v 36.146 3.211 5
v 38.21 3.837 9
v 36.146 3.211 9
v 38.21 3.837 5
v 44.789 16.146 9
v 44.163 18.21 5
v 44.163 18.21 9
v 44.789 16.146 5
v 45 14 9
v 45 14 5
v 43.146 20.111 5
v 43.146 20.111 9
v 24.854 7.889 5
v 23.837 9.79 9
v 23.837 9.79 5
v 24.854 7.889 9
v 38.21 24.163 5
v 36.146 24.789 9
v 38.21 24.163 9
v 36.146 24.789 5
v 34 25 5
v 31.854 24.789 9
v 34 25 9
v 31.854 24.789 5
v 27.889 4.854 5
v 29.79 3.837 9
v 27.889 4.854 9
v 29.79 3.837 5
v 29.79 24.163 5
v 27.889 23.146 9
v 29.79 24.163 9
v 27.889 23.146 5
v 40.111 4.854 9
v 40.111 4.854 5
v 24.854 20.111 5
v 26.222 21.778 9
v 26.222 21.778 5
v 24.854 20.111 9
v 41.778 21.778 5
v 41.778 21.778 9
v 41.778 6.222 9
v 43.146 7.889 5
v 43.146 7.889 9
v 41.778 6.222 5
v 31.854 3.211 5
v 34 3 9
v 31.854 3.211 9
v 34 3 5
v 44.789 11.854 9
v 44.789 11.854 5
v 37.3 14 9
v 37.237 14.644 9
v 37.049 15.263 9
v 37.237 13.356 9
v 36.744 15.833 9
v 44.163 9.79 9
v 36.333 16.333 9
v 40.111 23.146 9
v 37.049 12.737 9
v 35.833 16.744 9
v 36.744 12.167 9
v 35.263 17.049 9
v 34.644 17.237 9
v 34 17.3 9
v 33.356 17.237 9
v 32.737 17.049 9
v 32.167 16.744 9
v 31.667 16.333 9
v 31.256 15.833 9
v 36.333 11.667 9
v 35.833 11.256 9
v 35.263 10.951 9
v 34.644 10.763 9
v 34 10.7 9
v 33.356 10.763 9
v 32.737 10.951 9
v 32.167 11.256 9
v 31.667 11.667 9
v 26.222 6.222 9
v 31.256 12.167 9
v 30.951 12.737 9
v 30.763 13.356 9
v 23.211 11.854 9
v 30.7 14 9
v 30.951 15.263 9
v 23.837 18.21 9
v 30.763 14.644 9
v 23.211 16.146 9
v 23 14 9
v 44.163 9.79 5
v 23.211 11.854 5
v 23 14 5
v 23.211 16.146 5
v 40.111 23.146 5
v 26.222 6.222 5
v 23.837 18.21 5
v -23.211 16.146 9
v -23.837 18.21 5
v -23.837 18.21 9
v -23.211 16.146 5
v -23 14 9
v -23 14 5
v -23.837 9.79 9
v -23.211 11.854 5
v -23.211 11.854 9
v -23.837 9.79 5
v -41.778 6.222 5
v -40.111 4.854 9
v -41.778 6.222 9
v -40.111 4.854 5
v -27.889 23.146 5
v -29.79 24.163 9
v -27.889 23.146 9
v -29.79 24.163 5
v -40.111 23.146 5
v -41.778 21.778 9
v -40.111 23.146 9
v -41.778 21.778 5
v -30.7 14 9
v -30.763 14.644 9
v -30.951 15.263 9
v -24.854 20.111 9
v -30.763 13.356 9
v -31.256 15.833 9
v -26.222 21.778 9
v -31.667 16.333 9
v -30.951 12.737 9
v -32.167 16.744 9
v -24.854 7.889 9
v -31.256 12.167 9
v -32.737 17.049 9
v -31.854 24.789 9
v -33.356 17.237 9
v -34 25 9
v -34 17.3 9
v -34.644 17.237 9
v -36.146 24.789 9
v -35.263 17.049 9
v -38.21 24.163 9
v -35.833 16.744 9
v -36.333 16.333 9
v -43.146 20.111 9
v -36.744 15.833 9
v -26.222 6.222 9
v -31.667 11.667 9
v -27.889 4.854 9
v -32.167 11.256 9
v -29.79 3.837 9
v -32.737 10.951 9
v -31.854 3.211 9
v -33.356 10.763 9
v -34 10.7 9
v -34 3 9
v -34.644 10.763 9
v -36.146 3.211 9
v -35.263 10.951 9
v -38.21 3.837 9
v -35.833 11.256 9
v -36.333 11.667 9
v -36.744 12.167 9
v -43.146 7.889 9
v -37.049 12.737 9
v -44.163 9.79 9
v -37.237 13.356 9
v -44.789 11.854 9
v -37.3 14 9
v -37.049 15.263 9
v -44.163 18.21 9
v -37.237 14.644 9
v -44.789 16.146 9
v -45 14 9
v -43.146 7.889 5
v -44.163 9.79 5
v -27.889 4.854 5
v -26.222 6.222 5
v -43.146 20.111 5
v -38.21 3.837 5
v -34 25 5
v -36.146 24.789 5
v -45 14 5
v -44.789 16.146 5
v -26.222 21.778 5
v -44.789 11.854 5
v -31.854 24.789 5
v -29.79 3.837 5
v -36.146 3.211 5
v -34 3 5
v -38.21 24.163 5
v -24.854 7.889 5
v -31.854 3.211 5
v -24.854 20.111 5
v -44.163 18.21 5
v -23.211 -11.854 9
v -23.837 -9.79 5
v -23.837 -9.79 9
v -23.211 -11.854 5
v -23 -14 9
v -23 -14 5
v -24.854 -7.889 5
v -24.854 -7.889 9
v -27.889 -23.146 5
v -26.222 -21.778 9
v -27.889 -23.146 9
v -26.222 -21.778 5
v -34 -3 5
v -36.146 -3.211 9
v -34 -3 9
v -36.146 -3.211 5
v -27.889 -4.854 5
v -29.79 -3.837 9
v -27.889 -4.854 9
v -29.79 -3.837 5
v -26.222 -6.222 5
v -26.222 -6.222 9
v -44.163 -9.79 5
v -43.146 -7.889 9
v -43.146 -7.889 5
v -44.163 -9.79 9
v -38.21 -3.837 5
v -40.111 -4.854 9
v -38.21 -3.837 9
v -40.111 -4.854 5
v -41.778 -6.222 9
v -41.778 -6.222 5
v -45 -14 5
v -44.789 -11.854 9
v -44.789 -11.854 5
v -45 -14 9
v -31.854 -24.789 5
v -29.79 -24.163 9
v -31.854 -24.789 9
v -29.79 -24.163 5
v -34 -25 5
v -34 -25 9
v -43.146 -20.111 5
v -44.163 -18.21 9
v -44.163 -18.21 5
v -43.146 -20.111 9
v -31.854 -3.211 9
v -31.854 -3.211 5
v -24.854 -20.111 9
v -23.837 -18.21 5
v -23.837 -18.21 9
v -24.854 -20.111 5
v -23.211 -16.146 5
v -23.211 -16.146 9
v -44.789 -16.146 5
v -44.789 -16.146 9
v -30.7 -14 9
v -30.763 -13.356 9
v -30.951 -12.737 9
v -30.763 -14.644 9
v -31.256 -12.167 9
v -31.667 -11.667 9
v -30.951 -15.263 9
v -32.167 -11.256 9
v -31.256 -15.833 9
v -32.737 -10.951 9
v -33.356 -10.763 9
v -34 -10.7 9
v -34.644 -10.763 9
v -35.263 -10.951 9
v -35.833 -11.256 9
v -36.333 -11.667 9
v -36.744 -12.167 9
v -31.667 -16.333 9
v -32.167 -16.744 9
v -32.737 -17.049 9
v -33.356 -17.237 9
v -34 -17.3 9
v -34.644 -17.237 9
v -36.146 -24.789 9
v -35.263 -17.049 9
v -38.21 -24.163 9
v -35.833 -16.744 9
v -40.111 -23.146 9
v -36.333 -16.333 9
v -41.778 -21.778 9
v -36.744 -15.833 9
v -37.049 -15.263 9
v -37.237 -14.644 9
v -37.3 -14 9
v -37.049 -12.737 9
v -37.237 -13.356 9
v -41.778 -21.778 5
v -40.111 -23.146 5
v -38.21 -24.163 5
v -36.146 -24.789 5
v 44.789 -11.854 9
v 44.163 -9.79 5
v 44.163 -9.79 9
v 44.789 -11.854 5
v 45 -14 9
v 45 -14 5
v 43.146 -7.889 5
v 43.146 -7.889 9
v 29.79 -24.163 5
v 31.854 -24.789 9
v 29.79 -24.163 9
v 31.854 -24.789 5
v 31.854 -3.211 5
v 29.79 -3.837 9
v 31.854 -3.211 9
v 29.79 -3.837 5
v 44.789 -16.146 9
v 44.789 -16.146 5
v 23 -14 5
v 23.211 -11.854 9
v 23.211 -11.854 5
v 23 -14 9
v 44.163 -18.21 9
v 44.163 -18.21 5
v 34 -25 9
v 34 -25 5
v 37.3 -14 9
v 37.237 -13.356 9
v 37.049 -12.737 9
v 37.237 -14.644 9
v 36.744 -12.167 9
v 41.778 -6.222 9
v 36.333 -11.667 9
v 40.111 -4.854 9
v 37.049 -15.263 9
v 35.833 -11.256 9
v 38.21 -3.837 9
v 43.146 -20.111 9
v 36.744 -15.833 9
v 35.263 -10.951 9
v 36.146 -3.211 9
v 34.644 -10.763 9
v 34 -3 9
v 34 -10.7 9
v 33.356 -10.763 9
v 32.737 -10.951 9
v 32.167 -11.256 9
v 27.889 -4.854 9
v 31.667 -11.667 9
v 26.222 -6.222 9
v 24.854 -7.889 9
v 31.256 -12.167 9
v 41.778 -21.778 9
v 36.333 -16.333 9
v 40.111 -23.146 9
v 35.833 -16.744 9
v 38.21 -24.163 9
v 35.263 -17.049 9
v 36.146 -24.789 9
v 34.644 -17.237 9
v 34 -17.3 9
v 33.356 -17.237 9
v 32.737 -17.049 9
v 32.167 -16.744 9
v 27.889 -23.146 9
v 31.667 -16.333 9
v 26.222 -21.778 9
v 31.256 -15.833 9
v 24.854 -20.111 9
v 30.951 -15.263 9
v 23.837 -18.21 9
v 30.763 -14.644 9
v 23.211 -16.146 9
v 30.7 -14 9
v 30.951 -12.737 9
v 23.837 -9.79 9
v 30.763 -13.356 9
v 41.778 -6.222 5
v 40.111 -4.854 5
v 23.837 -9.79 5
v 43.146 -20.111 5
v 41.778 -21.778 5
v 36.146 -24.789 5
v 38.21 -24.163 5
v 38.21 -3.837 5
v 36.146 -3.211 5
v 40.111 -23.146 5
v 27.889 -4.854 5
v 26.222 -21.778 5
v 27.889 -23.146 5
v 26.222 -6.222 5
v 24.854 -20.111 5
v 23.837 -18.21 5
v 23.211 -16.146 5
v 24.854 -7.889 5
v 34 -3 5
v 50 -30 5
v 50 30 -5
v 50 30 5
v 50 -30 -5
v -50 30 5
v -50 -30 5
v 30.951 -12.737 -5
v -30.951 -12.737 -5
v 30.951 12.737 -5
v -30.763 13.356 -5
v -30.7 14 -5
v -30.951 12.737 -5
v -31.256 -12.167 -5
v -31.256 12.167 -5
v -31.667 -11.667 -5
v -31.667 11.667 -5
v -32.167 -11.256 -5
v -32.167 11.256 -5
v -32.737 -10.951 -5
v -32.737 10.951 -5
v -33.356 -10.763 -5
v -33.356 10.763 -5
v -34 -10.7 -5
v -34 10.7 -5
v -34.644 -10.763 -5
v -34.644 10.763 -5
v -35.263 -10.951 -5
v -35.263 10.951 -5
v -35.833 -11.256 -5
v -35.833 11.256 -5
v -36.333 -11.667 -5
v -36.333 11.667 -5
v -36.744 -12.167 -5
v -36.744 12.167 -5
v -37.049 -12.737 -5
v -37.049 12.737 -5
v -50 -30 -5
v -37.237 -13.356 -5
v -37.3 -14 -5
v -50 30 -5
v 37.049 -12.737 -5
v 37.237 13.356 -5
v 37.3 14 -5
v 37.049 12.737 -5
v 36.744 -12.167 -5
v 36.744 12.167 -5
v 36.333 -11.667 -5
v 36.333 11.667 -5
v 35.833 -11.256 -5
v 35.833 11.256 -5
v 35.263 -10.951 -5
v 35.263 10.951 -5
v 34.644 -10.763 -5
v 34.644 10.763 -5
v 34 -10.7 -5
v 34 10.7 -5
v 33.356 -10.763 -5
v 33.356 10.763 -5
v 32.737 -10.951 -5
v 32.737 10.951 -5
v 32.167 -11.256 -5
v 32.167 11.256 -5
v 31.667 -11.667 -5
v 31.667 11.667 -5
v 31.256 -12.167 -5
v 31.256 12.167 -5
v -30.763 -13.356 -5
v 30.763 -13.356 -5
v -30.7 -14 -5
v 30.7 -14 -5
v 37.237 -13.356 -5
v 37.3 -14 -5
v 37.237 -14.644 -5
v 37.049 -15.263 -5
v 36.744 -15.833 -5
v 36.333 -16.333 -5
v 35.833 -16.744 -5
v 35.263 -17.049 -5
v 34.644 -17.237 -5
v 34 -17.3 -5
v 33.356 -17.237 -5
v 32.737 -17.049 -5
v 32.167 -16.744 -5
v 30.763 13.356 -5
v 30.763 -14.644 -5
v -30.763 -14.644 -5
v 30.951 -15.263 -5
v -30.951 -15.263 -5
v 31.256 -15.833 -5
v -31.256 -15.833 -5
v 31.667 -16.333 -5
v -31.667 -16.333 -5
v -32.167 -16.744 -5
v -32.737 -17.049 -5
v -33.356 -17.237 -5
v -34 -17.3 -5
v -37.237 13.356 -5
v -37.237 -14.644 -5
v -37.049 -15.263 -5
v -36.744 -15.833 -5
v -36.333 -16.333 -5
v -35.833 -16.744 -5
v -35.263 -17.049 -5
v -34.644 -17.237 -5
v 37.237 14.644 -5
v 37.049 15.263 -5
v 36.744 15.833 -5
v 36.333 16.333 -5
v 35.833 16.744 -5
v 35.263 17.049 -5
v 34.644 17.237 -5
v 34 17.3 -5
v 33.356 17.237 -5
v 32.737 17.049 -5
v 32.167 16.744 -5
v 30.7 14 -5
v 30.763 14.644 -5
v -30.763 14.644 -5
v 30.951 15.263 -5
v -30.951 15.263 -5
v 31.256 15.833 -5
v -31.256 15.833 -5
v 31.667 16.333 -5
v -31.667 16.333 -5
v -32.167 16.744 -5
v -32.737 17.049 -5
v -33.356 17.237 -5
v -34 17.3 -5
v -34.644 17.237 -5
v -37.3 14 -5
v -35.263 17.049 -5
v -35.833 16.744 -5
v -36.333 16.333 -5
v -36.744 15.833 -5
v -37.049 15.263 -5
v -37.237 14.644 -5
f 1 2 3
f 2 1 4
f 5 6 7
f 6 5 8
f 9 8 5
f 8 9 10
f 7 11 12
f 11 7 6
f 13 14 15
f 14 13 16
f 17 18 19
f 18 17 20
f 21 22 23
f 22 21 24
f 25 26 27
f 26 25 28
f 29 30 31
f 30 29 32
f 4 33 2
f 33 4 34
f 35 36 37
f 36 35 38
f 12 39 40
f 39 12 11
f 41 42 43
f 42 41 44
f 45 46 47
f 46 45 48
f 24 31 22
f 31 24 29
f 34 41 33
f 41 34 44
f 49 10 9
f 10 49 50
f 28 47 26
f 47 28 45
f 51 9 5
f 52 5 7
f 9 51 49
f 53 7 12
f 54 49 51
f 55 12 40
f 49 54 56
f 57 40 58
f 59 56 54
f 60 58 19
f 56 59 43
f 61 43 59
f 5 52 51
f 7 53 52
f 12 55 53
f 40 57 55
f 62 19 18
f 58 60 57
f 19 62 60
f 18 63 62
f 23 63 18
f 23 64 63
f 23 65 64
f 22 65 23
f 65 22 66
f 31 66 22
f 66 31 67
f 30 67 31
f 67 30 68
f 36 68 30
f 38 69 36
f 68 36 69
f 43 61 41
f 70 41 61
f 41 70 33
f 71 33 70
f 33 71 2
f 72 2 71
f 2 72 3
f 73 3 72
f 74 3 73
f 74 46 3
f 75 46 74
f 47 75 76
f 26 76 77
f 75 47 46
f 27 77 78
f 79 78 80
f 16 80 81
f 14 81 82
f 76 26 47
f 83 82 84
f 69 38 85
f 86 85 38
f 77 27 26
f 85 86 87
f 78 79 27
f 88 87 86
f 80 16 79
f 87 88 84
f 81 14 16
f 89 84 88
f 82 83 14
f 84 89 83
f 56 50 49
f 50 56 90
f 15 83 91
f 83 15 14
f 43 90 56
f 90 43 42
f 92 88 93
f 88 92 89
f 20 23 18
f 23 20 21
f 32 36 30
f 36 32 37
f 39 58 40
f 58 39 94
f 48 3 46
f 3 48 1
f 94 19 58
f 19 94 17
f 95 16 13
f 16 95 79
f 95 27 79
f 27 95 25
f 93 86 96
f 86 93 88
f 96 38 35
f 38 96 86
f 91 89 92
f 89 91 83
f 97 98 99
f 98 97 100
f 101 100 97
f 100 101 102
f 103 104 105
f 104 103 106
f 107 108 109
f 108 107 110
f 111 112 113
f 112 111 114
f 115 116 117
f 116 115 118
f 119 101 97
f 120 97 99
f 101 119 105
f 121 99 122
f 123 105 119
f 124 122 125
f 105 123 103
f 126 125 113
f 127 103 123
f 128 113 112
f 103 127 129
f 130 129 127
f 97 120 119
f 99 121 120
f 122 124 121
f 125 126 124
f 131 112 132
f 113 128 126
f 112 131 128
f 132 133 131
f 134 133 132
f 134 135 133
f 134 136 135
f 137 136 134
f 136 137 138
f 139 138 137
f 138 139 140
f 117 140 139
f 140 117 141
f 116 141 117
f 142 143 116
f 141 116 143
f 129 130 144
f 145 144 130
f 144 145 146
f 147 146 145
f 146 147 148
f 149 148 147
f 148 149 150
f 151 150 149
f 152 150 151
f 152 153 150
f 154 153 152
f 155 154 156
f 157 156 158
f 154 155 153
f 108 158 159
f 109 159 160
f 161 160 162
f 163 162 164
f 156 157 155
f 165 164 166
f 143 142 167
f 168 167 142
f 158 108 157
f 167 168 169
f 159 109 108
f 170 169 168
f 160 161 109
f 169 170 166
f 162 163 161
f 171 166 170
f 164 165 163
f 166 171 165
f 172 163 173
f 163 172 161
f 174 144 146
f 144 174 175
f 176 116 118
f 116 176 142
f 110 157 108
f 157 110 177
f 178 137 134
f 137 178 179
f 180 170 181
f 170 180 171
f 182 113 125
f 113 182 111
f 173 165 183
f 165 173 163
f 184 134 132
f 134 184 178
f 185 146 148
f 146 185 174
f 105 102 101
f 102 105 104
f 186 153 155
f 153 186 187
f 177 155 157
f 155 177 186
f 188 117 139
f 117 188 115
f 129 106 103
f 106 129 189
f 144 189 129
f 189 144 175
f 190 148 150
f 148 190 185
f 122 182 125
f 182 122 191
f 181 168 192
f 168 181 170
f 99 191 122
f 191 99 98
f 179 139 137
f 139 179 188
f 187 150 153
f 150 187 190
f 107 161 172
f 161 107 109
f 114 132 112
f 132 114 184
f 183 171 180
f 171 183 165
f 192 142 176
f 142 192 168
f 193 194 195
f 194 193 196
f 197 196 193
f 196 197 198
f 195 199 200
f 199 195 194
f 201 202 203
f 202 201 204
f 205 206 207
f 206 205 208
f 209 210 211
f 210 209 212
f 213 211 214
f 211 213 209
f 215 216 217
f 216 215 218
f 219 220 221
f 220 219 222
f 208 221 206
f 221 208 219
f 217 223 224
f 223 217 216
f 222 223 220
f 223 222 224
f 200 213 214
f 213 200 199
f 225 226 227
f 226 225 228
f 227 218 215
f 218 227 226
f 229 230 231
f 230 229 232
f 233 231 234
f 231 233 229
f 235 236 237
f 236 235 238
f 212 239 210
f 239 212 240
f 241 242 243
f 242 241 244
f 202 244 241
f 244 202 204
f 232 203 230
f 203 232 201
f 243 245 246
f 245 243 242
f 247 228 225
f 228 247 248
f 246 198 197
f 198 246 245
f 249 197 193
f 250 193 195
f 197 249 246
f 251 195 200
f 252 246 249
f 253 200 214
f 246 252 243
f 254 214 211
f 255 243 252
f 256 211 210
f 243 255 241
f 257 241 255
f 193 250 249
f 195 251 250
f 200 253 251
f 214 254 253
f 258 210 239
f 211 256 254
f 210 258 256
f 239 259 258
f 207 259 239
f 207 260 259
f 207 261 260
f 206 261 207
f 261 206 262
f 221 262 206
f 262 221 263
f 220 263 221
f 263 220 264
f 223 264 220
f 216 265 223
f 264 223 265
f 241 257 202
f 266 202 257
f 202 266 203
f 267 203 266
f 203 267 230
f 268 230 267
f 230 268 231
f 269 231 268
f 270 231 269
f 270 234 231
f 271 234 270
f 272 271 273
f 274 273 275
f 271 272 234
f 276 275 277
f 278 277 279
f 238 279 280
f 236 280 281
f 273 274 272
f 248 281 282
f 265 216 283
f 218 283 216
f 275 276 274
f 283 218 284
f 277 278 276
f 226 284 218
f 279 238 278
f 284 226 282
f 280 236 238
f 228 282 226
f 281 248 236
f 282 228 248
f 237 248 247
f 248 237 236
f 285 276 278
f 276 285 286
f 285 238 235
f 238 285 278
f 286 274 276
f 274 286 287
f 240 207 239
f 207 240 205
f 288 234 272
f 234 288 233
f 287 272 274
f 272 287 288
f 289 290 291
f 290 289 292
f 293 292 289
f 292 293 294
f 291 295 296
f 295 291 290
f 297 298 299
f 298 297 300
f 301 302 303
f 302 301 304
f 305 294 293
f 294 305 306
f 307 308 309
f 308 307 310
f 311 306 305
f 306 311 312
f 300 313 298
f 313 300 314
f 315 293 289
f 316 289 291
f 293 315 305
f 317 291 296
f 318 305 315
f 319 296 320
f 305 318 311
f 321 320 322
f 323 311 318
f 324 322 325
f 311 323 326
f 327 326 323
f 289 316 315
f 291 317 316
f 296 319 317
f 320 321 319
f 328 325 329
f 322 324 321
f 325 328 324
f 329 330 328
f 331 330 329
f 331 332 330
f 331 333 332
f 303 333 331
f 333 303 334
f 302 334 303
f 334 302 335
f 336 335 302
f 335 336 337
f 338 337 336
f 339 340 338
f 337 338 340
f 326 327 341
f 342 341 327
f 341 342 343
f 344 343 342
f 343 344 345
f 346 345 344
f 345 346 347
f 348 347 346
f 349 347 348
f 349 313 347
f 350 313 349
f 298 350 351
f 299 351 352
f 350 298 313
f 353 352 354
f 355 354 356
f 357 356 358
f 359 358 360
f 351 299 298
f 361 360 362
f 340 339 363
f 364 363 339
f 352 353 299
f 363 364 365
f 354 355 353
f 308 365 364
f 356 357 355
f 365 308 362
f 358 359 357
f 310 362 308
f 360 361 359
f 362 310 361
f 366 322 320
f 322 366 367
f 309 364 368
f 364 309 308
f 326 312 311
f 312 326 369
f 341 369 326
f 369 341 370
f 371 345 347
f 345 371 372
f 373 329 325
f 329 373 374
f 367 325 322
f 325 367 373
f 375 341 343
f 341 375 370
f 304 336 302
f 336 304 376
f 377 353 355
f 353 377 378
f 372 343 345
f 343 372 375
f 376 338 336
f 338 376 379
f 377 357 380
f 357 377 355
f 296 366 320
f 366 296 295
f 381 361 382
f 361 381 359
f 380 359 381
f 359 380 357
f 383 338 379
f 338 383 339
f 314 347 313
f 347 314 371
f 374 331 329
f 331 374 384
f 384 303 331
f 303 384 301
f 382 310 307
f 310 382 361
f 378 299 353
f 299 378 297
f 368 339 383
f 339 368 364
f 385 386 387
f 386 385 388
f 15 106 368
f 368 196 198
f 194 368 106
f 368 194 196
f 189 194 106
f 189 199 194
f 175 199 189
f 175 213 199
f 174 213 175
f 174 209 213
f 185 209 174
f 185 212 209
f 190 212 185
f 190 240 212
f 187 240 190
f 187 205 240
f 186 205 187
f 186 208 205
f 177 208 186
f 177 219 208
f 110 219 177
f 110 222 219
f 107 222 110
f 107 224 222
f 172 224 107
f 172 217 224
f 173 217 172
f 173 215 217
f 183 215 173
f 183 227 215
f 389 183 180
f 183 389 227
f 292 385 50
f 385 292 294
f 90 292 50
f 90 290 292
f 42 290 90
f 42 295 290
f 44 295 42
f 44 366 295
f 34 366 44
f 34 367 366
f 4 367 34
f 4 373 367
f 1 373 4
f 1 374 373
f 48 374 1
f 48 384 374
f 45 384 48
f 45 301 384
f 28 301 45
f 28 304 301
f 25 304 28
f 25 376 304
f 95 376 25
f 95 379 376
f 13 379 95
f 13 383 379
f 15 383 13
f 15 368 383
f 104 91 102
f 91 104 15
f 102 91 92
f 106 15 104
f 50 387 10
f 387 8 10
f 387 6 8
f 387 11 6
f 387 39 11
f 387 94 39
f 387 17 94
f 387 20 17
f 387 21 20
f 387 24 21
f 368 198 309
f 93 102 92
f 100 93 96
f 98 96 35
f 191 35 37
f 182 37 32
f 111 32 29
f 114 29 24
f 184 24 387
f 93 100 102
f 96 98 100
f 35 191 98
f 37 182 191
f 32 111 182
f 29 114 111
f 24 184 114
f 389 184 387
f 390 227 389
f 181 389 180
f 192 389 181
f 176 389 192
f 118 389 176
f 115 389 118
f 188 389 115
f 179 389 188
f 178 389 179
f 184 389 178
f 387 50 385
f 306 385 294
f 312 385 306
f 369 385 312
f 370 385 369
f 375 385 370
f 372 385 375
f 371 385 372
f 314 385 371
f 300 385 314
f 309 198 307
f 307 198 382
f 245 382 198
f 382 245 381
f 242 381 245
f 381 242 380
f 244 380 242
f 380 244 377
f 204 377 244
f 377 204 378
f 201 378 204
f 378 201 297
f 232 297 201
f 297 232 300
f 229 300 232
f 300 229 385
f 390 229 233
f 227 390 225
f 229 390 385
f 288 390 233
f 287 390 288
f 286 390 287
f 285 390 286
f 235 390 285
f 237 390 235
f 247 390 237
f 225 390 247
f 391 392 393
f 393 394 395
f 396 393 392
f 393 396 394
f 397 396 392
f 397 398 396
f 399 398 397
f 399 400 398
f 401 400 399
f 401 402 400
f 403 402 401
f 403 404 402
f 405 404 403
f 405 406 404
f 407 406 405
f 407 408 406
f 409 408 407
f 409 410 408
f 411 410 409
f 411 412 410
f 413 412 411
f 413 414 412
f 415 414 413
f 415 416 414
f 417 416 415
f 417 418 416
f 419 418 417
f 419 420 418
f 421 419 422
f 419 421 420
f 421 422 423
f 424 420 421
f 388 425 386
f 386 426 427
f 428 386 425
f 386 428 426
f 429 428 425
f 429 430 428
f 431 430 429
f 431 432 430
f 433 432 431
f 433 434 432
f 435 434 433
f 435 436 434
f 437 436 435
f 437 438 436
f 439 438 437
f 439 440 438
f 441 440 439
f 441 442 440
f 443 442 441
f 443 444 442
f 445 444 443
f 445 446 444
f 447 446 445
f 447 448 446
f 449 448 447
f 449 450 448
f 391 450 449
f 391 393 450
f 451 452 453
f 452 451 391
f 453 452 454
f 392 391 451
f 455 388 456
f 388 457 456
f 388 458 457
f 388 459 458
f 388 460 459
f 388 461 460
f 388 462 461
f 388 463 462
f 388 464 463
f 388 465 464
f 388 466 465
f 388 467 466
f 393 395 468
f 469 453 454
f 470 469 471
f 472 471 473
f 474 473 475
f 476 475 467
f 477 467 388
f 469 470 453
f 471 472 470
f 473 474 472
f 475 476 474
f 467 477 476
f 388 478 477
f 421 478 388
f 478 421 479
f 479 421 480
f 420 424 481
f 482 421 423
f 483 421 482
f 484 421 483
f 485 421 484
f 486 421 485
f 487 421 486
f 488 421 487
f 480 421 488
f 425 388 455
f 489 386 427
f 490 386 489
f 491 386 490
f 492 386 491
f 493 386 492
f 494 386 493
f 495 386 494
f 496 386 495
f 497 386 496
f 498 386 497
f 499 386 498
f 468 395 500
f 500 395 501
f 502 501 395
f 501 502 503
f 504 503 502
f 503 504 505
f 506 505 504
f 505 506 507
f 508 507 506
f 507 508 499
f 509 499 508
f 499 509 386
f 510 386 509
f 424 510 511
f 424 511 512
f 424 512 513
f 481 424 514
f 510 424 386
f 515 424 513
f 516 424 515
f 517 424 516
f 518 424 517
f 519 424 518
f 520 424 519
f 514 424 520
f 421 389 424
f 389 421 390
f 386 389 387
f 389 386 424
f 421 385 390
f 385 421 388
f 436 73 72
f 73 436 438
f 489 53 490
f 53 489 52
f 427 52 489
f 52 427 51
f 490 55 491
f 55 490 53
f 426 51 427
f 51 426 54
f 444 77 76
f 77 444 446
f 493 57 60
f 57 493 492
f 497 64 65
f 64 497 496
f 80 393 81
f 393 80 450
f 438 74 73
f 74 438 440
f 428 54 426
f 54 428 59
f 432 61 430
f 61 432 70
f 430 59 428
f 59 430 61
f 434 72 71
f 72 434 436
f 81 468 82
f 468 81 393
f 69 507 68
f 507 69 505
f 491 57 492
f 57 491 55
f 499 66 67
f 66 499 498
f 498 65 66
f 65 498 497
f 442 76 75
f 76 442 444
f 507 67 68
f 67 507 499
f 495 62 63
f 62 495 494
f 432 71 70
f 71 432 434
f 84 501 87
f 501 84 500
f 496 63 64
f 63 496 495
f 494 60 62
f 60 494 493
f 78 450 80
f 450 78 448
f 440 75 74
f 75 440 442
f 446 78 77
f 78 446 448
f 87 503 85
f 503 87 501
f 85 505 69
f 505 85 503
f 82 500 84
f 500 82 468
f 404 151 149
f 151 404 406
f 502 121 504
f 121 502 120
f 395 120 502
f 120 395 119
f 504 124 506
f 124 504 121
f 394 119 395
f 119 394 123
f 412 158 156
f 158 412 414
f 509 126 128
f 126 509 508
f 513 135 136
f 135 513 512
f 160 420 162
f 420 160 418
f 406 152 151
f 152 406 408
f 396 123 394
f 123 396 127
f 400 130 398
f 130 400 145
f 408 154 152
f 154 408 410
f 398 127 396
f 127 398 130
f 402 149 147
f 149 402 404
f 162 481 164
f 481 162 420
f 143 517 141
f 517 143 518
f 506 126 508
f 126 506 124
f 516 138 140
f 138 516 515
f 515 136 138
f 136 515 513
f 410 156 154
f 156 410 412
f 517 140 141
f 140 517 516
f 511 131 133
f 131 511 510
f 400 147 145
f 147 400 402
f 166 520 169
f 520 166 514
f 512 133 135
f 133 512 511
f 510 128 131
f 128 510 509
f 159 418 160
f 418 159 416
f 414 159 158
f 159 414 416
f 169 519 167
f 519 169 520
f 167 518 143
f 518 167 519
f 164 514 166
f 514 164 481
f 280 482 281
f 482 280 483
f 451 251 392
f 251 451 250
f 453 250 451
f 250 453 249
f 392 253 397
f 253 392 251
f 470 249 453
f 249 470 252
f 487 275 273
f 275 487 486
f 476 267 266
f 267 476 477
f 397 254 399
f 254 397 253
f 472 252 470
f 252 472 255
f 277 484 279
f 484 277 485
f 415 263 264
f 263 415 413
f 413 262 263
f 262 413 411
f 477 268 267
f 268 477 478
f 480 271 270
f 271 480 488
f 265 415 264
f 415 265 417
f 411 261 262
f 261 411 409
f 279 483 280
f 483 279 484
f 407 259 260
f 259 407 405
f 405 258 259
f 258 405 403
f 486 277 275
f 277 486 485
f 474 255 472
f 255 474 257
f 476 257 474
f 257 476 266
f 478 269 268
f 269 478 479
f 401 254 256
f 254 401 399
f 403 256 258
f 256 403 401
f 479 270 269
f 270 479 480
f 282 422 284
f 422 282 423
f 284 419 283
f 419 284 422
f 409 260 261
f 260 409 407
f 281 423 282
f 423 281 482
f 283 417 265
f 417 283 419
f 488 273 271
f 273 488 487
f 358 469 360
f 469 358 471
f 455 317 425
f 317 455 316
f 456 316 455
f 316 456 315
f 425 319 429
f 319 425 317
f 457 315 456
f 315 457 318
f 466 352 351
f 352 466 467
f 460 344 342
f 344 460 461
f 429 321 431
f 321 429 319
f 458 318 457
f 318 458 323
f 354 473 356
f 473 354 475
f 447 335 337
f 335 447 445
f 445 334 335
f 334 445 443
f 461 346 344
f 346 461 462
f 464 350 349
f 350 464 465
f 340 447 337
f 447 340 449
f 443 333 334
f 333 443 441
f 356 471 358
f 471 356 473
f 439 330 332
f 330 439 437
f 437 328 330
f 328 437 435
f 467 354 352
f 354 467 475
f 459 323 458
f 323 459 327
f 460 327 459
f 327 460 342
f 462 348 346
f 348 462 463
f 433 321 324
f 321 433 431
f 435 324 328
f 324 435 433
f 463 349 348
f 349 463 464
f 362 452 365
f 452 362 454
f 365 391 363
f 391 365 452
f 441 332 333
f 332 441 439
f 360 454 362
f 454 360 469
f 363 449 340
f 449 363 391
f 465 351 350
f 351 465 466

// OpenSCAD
$fn = 32;

// ----------------------------------------------------------------------
// Anchor pads 100 x 60 x 14
// four corner bosses with anchor holes
// ----------------------------------------------------------------------

// --- parameters (mm) ---
plate = [100, 60, 10];  // base plate size (x, y, z)
pads = 4;               // boss count, one per corner
edge = 16;              // boss centre offset from the plate edge
boss_d = 22;            // boss diameter
boss_h = 4;             // boss height above the base plate
hole_d = 6.6;           // hole diameter

// --- derived feature positions (mm) ---
height = plate[2] + boss_h;      // = 14   overall height of the part
corner_x = plate[0] / 2 - edge;  // = 34   boss centre X
corner_y = plate[1] / 2 - edge;  // = 14   boss centre Y
feature_centers = [
  [corner_x, corner_y],
  [-corner_x, corner_y],
  [-corner_x, -corner_y],
  [corner_x, -corner_y]
];   // boss centres, anchor holes are drilled there

// base plate, four bosses standing on it, anchor holes all the way through
difference() {
  union() {
    cube(plate, center = true);
    for (centre = feature_centers)
      translate([centre[0], centre[1], plate[2] / 2 - 1])
        cylinder(d = boss_d, h = boss_h + 1);
  }
  for (centre = feature_centers)
    translate([centre[0], centre[1], -height])
      cylinder(d = hole_d, h = 2 * height + 2);  // through boss and plate
}
